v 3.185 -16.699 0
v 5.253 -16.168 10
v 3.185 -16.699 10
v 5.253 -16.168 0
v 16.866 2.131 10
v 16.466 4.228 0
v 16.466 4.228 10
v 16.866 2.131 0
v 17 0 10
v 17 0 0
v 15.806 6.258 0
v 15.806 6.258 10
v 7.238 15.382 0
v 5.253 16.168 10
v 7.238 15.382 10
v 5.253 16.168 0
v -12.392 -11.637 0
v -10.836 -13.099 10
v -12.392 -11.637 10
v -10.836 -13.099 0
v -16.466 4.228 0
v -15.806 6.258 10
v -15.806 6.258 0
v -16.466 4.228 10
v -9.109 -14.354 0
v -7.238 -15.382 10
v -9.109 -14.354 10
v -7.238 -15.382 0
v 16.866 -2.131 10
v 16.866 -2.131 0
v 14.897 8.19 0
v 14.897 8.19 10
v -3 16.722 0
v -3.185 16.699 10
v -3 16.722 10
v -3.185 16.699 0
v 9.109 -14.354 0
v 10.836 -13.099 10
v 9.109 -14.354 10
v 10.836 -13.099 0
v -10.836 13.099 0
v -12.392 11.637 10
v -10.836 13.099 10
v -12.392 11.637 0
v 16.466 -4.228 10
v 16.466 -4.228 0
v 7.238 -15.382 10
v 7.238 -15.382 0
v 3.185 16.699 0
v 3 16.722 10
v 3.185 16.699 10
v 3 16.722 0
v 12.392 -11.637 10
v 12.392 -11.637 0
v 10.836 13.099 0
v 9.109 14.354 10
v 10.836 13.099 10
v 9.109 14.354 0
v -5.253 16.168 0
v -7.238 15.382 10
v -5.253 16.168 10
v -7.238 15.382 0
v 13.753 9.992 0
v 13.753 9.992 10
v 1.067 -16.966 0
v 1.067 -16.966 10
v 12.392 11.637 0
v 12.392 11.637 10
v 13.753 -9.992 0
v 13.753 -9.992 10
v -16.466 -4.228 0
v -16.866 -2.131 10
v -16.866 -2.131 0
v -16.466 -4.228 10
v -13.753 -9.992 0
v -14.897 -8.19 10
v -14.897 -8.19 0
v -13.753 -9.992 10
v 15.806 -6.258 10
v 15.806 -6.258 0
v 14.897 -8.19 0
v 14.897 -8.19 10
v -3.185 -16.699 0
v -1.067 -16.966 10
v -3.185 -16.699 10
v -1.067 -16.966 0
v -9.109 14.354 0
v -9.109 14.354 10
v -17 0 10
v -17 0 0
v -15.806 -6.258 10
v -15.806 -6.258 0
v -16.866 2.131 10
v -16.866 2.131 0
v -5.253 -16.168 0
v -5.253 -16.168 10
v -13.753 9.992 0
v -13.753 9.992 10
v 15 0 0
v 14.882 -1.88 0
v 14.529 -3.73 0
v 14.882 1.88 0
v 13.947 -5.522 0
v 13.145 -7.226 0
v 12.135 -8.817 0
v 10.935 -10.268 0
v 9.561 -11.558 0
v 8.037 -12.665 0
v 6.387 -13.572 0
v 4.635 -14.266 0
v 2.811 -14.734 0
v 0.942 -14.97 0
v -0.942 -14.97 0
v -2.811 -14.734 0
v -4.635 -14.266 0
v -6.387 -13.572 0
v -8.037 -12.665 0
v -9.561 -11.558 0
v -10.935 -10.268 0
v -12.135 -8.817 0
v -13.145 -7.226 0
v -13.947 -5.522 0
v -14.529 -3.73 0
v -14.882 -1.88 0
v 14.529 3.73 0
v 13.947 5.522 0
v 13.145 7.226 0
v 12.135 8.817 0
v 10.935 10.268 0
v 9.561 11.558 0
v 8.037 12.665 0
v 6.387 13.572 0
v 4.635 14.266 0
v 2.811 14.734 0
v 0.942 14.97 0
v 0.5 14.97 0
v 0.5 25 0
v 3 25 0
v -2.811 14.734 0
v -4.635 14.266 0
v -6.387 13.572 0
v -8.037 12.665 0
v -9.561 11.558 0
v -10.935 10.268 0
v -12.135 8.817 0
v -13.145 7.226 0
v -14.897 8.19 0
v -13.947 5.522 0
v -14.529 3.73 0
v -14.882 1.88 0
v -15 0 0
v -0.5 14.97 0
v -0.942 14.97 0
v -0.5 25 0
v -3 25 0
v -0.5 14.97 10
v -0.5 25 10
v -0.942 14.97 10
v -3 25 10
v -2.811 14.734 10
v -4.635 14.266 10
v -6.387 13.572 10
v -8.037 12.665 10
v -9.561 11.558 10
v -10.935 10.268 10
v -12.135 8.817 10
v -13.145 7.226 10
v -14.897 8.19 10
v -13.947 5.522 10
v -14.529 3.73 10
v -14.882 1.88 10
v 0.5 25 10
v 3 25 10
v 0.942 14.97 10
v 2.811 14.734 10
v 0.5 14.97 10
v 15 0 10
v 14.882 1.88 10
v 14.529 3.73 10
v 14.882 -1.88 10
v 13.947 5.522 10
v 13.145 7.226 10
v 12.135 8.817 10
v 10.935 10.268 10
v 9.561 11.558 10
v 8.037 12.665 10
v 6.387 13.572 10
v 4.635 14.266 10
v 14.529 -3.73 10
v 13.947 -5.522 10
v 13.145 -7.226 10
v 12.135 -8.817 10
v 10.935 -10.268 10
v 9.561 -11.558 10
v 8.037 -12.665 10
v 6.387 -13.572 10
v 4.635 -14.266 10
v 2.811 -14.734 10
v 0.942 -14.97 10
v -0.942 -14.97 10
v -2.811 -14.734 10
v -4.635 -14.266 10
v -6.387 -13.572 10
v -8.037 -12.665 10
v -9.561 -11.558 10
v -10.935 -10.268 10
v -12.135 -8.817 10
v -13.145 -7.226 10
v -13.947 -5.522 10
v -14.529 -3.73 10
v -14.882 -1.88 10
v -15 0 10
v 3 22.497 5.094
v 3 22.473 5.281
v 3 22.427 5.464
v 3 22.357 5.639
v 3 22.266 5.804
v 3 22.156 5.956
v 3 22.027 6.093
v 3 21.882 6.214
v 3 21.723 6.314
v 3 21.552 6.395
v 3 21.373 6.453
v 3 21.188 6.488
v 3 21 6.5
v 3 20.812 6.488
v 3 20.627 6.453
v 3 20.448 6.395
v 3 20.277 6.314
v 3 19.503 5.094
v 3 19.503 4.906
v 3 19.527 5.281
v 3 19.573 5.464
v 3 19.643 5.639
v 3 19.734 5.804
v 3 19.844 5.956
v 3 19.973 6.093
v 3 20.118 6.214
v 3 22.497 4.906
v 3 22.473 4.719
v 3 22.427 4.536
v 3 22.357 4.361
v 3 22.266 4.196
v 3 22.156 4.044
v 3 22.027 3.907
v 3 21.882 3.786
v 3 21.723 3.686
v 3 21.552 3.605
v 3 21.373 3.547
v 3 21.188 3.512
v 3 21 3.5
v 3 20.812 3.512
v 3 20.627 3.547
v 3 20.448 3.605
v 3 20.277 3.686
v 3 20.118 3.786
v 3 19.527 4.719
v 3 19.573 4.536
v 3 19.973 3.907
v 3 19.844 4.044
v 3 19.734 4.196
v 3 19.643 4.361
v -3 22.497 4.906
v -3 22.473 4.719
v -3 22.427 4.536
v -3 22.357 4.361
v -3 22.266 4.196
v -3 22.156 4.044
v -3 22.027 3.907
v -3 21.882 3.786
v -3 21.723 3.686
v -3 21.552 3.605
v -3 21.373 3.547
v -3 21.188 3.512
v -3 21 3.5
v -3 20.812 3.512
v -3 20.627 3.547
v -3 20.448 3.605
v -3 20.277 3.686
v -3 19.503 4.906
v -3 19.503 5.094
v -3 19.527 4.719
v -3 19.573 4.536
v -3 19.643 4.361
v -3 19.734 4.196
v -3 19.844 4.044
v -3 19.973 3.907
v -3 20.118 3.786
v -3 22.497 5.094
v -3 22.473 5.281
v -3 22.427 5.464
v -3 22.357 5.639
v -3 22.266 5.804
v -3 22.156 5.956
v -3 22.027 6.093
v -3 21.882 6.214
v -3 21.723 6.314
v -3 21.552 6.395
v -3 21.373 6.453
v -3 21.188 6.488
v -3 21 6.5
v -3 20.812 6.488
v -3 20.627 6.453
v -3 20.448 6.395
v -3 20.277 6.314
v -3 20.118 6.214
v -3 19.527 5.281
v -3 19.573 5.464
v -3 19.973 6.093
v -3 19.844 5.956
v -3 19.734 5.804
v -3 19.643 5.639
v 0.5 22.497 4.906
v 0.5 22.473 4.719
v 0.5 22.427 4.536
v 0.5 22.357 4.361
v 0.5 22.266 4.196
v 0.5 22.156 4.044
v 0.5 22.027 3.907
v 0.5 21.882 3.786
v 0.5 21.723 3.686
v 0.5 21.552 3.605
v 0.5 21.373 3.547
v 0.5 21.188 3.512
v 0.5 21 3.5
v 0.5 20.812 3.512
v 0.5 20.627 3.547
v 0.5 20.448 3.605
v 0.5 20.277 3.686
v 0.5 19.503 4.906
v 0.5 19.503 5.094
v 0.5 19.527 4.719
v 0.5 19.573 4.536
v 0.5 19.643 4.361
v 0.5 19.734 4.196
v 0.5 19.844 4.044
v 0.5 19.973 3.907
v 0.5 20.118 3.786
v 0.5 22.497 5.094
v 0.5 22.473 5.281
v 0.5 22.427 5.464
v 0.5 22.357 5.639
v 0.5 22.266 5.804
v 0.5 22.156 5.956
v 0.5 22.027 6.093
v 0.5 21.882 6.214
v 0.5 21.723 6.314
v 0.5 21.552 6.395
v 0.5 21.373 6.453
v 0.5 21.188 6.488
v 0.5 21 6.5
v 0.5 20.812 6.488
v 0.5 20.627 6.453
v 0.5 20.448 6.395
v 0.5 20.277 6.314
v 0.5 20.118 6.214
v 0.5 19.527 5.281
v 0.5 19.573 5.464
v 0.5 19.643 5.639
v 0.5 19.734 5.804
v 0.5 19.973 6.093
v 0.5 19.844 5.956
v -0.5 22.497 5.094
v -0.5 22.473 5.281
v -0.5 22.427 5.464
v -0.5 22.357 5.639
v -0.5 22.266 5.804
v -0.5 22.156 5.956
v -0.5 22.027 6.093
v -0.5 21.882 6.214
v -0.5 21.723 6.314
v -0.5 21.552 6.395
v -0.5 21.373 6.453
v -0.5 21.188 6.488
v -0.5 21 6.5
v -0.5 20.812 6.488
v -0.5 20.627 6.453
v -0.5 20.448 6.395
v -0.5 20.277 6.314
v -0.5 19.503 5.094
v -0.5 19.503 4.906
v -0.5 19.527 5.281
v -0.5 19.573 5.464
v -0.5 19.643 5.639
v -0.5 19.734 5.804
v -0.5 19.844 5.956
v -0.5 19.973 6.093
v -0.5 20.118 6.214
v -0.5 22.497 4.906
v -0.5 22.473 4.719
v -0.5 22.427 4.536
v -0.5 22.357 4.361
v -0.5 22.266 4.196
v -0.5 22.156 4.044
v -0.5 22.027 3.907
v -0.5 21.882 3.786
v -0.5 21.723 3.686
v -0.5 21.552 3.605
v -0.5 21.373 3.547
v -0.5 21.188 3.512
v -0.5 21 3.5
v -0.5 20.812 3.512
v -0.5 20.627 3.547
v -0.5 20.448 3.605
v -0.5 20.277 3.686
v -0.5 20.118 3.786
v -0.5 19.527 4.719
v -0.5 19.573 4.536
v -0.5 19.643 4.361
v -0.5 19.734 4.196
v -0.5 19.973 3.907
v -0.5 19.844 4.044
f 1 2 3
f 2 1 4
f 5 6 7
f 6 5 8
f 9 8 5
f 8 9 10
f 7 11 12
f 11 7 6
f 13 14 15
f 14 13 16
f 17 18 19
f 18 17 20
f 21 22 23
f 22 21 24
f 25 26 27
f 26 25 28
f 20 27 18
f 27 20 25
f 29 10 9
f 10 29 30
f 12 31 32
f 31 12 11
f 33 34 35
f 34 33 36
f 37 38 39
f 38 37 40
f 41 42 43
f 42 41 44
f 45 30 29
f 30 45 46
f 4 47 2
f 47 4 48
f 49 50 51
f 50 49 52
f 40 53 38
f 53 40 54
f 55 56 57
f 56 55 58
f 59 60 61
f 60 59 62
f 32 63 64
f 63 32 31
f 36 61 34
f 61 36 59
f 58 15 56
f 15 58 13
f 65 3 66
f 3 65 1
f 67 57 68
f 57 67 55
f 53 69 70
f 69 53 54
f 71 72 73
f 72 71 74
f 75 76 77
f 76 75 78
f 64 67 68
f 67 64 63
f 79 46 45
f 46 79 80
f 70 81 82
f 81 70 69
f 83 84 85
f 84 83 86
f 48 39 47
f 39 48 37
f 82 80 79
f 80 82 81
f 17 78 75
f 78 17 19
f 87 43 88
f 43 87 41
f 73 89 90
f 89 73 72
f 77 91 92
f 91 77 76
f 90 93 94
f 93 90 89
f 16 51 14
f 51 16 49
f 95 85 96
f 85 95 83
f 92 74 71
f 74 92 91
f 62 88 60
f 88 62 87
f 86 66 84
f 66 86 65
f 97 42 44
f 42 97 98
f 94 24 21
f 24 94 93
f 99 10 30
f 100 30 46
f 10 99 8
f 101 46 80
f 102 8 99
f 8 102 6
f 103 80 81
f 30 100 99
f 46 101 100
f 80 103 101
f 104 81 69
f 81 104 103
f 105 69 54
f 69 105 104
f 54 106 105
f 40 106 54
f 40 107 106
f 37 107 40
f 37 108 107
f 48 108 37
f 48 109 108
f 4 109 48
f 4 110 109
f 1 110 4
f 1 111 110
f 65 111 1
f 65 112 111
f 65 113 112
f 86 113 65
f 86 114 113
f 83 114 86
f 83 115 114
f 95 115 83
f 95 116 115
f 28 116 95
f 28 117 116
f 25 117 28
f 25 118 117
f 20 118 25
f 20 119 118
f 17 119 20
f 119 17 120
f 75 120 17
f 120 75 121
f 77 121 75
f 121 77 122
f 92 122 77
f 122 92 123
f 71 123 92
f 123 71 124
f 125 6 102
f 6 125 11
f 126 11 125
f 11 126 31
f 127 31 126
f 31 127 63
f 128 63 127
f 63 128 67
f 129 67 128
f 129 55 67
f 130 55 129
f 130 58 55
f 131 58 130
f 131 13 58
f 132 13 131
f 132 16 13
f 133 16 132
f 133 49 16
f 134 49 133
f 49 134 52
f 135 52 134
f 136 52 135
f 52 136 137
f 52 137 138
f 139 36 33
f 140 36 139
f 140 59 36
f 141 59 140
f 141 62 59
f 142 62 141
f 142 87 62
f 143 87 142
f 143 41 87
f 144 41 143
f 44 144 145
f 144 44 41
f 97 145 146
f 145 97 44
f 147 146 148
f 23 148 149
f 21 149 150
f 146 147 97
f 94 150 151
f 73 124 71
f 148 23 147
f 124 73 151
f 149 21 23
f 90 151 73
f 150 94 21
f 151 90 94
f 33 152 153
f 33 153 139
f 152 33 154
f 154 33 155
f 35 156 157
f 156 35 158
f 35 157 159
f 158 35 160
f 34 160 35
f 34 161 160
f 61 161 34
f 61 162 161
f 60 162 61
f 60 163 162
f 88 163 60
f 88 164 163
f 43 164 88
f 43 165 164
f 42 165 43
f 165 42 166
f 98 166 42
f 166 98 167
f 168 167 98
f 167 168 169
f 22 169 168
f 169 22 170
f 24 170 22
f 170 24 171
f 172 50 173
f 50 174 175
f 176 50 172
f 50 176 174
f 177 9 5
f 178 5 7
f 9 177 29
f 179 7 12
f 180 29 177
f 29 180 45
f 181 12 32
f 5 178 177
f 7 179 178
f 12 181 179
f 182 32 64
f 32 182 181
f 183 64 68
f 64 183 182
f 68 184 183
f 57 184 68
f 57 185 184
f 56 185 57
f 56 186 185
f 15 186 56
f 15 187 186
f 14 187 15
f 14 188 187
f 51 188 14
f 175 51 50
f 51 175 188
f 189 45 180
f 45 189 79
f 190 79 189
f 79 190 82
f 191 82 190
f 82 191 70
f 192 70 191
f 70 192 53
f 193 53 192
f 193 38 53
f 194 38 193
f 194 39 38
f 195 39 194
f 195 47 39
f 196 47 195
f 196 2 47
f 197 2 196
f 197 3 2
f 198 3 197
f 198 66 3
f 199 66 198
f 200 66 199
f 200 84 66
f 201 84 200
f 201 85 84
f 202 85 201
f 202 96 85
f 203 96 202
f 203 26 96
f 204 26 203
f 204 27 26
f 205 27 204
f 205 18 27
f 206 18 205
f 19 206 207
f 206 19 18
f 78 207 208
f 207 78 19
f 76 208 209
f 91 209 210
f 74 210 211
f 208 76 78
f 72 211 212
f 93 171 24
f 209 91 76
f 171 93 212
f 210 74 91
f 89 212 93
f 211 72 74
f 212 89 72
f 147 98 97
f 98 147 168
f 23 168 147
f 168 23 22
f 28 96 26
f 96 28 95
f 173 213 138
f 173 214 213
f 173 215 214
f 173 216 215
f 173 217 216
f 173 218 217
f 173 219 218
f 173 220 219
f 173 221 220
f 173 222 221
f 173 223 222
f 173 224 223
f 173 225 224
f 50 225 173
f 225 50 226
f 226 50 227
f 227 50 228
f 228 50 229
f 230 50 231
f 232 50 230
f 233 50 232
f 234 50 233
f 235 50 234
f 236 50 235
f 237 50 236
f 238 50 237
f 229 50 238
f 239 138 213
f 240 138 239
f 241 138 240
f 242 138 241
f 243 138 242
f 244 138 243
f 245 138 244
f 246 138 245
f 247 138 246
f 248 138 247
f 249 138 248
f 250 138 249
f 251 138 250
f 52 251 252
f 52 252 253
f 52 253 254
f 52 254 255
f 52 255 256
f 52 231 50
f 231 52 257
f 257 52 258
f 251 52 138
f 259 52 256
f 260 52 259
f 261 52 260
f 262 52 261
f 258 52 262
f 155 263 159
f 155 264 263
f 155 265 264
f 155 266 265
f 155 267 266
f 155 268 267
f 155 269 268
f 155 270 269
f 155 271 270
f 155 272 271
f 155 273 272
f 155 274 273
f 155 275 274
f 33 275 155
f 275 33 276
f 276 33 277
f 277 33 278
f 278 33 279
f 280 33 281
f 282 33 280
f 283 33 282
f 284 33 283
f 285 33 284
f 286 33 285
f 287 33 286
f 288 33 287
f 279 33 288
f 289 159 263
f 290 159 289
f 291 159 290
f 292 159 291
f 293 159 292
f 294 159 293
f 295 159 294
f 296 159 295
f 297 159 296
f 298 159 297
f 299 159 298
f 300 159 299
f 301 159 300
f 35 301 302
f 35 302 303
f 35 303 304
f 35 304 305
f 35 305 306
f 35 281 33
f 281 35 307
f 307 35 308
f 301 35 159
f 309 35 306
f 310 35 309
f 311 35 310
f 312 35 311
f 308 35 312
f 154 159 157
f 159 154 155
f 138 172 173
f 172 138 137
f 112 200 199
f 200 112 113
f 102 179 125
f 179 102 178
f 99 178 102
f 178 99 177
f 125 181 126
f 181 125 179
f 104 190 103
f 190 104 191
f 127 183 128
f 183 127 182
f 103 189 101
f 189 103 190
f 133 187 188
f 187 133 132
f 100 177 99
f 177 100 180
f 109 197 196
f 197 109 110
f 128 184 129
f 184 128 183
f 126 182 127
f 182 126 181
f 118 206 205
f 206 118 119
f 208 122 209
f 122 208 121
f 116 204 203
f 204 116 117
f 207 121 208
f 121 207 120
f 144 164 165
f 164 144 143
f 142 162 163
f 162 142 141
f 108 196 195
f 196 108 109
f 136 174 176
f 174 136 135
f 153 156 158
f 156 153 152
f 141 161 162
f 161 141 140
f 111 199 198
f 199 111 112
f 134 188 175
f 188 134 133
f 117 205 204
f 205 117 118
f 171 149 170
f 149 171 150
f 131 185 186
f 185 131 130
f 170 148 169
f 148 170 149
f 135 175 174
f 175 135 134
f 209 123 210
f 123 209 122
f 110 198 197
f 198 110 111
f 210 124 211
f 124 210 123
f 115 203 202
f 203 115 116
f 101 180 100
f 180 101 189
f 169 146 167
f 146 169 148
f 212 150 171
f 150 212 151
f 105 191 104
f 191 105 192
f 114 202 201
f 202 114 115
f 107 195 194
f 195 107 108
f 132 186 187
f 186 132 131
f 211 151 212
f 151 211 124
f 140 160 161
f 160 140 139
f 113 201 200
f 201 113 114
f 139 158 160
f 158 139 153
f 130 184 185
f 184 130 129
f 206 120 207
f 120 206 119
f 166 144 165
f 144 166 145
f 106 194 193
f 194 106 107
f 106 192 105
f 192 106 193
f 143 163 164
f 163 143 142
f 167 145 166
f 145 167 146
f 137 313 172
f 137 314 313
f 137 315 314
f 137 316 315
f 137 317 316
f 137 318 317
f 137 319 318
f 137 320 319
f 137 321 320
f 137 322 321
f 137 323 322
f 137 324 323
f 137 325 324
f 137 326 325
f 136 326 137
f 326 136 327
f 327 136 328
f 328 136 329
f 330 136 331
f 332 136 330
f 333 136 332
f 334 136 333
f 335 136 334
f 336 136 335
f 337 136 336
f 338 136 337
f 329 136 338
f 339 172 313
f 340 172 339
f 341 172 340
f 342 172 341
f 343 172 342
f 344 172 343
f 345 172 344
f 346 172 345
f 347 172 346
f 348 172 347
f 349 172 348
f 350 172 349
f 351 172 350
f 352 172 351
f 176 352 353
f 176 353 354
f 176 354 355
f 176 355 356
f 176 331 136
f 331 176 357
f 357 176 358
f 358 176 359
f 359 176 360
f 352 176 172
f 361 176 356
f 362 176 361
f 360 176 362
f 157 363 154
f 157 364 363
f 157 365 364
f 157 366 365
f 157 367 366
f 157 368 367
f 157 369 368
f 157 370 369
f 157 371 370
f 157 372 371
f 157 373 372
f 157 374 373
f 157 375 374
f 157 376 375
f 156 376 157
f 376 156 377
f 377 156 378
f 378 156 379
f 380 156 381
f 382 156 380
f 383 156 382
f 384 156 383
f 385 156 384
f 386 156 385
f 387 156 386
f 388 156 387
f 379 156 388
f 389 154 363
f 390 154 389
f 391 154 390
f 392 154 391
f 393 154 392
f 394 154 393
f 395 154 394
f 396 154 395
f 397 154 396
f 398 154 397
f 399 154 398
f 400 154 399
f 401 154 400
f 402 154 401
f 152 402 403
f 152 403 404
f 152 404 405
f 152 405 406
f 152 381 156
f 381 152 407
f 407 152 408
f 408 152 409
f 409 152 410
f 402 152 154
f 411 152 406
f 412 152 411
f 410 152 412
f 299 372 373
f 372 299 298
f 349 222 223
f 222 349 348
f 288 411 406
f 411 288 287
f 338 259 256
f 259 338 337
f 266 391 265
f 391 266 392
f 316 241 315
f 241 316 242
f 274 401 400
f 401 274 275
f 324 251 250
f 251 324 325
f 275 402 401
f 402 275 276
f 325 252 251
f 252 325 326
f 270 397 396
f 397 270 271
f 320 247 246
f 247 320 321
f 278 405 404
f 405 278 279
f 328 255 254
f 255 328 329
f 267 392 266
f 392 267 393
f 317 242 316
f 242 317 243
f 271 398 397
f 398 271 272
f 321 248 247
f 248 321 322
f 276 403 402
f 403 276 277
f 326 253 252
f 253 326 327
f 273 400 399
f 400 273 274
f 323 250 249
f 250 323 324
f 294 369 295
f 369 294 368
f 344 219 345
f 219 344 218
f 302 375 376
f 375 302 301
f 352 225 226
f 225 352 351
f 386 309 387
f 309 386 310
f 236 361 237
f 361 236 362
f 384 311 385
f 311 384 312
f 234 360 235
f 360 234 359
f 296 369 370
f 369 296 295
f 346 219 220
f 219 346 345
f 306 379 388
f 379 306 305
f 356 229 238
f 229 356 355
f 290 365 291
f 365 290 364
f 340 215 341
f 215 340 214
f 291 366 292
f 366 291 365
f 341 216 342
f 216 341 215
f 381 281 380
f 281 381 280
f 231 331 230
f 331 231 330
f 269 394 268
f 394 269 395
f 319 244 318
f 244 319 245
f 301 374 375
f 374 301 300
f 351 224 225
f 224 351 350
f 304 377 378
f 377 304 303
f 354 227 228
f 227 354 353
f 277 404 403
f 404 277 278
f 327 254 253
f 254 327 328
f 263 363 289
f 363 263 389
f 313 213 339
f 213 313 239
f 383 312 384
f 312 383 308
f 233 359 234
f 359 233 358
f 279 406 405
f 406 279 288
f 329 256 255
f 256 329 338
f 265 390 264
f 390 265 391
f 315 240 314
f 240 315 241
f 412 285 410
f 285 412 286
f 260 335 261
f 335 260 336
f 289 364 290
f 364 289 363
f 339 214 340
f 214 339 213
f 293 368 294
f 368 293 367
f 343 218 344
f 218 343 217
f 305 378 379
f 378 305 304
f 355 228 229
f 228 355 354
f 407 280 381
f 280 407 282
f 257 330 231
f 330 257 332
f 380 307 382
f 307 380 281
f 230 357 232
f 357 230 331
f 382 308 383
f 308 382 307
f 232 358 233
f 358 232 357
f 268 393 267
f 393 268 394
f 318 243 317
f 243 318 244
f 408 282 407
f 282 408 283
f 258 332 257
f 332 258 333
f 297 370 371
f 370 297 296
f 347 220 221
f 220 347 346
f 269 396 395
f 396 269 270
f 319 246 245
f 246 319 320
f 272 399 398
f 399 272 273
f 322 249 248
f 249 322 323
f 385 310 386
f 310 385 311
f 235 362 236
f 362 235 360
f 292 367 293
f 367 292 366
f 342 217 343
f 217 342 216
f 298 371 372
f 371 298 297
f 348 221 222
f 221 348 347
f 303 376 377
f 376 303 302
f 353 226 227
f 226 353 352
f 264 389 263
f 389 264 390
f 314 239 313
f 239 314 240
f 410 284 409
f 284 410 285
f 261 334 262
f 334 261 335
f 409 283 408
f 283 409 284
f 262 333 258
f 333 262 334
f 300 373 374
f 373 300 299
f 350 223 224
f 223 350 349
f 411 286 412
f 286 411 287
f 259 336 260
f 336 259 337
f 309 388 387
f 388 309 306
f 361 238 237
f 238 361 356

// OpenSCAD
$fn = 50;

difference()
{
	union()
	{
		cylinder (r=17, h=10);
		translate([0,20,5]) cube([6,10,10], center=true);
	}
	
	union()
	{
		cylinder (r=15, h=10);
		translate([0,20,5]) cube([1,15,10], center=true);
		translate([-5,21,5]) rotate([0,90,0]) cylinder(r=1.5, h=10);
	}
}
